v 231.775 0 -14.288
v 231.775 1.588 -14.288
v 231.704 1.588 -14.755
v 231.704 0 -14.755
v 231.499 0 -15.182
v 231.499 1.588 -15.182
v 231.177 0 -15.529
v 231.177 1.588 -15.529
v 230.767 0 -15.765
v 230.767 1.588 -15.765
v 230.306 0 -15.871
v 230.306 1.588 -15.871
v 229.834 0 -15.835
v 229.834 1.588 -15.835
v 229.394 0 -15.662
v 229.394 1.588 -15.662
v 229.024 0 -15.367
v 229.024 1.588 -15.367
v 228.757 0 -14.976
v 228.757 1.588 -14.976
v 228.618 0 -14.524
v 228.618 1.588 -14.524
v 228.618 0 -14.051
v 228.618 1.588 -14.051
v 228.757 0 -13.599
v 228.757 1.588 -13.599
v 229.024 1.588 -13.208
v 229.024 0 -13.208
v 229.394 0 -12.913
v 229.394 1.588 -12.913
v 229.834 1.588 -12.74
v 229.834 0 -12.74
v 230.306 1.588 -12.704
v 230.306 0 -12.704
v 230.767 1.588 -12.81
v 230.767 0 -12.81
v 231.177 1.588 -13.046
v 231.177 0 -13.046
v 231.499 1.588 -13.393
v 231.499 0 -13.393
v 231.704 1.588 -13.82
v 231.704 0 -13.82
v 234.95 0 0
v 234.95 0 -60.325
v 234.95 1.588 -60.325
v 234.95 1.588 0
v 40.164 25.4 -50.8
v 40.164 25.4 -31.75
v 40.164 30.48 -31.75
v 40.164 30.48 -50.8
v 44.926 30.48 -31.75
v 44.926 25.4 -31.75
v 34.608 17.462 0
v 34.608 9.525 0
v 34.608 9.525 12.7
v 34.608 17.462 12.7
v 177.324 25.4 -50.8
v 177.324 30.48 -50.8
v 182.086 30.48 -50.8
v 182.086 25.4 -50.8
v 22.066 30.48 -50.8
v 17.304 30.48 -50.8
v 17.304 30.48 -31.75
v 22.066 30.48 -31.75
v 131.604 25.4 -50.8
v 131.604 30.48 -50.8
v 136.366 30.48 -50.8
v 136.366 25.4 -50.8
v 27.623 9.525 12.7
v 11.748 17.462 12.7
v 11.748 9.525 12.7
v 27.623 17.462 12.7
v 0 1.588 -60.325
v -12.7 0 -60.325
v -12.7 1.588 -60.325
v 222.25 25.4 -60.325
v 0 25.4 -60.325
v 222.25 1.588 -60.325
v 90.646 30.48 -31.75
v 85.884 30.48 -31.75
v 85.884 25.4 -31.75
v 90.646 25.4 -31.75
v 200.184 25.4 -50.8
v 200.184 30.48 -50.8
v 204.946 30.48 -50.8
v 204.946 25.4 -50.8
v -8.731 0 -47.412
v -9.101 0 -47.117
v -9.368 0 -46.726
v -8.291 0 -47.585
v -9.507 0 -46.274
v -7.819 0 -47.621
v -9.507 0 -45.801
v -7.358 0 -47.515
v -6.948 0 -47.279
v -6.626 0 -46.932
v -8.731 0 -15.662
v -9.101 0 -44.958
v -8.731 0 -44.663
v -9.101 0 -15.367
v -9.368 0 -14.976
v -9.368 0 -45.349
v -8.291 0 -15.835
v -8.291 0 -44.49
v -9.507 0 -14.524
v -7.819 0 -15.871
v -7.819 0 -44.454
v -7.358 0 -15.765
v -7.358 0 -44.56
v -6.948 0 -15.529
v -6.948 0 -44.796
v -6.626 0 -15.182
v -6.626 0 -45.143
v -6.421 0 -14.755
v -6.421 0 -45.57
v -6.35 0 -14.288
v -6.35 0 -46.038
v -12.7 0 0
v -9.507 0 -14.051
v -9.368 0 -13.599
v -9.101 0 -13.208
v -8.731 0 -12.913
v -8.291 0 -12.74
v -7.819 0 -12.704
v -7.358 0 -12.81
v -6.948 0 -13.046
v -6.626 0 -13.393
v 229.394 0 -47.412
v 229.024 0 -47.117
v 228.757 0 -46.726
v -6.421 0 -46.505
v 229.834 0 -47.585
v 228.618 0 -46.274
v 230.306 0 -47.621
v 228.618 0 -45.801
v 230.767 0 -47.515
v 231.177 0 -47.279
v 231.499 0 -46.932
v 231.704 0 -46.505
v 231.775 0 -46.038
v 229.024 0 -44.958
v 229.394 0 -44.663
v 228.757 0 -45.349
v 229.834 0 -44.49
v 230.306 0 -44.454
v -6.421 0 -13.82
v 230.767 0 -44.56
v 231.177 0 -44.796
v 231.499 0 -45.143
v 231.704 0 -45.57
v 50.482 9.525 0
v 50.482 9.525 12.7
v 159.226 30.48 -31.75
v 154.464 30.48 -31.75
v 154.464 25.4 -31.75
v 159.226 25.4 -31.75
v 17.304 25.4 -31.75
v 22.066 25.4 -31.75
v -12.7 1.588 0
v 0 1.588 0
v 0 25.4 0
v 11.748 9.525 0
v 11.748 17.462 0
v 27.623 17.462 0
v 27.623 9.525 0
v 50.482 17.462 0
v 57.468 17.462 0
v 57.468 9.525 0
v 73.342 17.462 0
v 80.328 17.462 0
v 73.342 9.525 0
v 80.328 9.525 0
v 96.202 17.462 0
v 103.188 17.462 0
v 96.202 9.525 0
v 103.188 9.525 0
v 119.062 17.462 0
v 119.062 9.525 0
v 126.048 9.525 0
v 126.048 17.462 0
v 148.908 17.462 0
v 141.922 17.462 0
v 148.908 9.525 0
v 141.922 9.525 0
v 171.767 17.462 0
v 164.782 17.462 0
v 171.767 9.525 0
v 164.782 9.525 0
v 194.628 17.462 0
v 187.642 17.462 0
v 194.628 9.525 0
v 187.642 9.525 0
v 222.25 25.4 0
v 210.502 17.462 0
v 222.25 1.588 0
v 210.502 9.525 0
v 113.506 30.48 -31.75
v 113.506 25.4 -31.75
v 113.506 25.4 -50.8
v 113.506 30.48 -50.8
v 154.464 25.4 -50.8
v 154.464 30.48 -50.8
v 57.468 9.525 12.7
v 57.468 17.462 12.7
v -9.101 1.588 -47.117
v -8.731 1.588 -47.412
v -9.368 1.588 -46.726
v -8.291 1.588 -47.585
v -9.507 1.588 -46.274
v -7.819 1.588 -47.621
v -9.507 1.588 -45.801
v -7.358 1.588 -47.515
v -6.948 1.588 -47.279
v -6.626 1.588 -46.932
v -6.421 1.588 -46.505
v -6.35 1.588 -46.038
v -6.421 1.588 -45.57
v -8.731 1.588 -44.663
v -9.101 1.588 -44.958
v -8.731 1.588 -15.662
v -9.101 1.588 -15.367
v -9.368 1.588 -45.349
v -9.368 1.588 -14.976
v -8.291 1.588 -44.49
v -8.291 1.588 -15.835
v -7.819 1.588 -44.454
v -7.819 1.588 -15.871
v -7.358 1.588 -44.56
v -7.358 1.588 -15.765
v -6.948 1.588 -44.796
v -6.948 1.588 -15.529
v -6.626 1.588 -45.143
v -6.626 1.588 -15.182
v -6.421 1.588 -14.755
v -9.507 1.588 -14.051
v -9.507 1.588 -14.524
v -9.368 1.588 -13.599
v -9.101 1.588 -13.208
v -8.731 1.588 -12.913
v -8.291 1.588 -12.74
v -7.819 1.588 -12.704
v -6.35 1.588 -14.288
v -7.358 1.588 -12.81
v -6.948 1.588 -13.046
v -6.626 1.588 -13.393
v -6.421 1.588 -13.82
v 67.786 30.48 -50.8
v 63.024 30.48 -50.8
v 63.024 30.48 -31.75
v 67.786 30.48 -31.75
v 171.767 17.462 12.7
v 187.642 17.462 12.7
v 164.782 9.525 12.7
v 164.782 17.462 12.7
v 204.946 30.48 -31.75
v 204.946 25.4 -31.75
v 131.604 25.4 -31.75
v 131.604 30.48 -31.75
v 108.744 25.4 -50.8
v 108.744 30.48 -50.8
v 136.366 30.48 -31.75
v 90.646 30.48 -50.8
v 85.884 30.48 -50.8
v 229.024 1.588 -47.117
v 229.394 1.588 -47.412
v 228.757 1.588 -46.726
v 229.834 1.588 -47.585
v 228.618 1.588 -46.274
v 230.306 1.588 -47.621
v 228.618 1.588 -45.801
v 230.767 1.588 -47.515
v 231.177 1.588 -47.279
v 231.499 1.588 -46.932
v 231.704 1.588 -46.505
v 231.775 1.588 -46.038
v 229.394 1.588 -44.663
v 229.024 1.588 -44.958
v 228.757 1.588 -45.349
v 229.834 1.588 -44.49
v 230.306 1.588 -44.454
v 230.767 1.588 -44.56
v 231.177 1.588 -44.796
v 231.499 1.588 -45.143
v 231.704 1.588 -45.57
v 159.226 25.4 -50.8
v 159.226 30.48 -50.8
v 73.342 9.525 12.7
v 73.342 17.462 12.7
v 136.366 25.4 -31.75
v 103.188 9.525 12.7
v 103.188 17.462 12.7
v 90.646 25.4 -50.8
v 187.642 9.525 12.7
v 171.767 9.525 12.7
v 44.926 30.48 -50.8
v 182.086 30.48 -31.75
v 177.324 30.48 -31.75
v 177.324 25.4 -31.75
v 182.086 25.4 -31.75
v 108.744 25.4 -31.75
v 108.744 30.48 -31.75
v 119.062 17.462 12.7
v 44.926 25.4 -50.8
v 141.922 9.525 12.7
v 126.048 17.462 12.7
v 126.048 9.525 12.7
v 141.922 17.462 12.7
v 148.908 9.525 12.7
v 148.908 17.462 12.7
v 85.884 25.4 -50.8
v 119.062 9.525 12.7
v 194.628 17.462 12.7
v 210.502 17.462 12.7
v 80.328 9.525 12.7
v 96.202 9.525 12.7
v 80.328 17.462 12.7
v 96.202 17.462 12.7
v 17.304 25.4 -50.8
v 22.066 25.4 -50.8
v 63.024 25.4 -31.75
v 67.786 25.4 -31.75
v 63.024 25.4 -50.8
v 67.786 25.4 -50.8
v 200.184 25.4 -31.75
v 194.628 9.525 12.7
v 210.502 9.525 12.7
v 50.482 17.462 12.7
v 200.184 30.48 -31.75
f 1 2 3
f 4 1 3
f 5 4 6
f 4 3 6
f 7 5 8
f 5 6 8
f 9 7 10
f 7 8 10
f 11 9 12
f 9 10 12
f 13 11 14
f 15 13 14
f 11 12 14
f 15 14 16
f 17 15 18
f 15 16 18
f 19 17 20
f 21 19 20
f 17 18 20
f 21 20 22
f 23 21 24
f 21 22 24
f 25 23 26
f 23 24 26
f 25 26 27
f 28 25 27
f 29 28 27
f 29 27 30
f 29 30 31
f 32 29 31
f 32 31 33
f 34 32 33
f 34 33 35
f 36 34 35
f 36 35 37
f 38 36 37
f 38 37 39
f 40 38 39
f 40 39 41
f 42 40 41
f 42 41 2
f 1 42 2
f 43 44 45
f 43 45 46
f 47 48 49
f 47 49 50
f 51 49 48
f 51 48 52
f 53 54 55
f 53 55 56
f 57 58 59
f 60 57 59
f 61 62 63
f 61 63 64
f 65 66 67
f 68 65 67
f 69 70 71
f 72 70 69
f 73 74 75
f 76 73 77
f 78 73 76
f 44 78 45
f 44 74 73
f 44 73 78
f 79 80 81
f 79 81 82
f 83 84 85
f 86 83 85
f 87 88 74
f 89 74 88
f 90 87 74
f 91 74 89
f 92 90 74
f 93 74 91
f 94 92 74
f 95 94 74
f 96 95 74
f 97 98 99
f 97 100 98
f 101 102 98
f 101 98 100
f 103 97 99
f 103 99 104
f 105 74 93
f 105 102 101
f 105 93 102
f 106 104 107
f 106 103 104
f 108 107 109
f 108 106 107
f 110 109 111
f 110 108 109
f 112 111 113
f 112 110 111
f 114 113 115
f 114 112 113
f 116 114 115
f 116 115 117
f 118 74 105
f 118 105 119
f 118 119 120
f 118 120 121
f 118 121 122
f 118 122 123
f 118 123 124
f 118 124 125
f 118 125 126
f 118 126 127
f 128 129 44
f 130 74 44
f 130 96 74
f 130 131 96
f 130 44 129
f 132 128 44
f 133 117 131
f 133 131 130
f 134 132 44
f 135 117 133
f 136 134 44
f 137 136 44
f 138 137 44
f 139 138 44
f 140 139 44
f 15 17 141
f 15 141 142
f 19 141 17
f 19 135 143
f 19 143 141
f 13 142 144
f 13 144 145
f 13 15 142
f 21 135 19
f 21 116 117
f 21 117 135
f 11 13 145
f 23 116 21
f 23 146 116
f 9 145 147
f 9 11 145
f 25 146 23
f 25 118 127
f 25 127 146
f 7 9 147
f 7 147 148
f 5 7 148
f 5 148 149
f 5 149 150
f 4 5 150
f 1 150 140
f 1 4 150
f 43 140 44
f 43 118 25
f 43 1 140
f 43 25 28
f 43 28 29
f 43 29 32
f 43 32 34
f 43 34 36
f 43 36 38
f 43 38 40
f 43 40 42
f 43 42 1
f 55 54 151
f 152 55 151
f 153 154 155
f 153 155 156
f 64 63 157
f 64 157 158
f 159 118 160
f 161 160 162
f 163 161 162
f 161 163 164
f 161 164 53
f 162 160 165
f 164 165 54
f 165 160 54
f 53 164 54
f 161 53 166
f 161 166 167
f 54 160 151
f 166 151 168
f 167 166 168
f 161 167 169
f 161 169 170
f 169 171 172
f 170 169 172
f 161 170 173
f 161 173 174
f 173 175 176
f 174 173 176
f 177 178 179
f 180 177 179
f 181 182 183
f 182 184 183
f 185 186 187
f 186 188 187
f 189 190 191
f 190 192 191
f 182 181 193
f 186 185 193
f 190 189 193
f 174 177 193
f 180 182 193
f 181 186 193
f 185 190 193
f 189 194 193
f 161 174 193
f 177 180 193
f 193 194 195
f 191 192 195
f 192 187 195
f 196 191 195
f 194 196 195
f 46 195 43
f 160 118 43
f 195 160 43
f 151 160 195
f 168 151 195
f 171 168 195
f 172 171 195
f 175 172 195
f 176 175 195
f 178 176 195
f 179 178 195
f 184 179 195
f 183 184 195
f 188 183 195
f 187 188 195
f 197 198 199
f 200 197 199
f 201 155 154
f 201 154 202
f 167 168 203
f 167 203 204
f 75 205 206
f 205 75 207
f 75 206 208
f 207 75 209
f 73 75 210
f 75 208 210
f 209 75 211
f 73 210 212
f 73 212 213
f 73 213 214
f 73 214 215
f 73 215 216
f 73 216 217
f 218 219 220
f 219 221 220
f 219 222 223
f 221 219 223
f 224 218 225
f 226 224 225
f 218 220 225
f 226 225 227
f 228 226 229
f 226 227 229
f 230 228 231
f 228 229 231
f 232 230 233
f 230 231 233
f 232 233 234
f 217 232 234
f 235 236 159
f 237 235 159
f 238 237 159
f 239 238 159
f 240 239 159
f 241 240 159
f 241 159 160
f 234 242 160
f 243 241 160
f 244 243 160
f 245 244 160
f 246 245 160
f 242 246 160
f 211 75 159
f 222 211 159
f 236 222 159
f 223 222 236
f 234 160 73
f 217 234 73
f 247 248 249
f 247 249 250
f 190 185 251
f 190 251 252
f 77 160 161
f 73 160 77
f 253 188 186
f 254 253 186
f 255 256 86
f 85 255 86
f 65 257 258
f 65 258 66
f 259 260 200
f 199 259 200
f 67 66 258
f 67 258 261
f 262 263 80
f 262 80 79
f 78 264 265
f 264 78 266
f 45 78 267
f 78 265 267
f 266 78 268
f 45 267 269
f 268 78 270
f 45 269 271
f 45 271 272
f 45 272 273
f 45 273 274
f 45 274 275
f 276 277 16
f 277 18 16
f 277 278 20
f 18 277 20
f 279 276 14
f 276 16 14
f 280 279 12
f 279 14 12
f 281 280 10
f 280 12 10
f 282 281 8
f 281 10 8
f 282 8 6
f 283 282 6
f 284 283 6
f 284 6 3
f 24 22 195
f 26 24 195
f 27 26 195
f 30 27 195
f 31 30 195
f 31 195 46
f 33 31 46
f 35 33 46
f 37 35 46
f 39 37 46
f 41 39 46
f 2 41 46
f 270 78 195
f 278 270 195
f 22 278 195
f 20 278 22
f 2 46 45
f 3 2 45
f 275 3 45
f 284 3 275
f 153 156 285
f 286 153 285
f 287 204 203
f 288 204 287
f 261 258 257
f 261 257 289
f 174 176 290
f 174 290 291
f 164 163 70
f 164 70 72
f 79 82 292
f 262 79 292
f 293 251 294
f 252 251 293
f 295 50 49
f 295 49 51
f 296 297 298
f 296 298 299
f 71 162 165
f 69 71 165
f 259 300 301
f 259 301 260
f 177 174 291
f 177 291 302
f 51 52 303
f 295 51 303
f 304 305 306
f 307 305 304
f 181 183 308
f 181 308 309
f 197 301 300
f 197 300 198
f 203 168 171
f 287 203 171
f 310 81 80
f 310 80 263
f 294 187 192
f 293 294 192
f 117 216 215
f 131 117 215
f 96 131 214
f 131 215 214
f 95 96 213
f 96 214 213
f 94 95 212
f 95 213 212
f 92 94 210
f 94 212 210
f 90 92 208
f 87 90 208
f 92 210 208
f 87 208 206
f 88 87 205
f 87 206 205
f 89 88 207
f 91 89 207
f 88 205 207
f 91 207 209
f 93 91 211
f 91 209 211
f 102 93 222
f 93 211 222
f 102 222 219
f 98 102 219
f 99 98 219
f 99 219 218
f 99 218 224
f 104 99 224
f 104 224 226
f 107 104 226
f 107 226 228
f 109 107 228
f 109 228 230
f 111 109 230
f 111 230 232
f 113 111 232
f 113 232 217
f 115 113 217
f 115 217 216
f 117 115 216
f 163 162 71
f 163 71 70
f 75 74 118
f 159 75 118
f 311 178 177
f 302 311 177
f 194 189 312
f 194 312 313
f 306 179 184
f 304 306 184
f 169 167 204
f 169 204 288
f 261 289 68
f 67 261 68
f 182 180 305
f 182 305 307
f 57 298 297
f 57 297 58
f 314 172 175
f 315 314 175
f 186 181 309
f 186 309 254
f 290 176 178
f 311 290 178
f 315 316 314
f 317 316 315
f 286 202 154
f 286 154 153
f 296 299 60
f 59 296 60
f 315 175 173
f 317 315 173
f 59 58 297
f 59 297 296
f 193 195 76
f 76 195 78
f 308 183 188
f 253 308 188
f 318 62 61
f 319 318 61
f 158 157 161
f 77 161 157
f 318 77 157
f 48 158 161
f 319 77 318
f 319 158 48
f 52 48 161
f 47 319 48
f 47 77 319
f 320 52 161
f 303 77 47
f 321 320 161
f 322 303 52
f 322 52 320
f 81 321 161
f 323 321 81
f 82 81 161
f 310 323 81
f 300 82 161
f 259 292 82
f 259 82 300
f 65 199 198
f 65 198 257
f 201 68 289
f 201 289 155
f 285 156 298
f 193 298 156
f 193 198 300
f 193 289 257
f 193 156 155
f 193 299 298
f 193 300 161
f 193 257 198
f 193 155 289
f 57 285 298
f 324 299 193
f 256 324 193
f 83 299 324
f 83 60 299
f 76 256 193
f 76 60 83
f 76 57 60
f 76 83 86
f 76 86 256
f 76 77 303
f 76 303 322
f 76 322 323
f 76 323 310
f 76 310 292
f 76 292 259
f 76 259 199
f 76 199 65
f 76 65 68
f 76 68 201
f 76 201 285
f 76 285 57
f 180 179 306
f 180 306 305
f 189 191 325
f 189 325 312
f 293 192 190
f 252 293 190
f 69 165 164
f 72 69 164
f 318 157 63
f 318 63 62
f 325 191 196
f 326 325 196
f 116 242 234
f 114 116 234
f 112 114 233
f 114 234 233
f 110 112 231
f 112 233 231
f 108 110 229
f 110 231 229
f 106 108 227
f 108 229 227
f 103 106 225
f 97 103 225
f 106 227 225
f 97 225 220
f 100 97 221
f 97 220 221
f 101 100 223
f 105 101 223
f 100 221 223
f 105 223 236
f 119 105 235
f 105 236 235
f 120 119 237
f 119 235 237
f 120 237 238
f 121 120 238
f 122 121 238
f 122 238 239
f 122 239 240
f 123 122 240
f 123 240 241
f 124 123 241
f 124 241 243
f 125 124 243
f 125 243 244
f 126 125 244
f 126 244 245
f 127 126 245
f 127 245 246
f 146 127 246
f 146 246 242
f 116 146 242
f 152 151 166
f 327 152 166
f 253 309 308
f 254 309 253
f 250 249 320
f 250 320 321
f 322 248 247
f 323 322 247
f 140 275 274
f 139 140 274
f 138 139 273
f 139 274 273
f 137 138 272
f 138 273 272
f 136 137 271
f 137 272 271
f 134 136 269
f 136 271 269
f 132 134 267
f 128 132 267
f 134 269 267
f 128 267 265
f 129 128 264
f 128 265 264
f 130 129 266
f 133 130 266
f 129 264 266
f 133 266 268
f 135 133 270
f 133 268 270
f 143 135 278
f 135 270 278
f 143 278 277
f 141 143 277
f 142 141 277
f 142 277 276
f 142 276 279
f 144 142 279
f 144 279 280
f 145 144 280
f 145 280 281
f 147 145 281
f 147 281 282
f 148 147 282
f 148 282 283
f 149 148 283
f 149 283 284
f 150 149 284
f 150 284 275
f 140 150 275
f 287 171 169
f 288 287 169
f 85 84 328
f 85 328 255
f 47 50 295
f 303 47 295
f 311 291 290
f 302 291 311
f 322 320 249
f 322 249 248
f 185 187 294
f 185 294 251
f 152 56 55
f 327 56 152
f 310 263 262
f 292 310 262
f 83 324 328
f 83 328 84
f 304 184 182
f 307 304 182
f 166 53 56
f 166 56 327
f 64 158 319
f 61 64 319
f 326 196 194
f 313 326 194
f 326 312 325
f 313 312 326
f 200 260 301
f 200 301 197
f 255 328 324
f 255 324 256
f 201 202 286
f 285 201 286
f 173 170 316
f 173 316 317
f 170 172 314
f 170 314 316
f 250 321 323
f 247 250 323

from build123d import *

# Parameters (mm, degrees)
SKETCH1_W           = 222.25
SKETCH1_H           = 60.325
BOSS_EXTRUDE1_DEPTH = 25.4
SKETCH2_W           = 12.7
SKETCH2_H           = 60.325
BOSS_EXTRUDE2_DEPTH = 1.5875
SKETCH3_R           = 1.5875
CUT_EXTRUDE1_DEPTH  = 2.5875
SKETCH4_W           = 4.7625
SKETCH4_H           = 19.05
BOSS_EXTRUDE3_DEPTH = 5.08
SKETCH5_W           = 15.875
SKETCH5_H           = 7.9375
BOSS_EXTRUDE4_DEPTH = 12.7
LPATTERN1_COUNT     = 5
LPATTERN1_PITCH     = 22.86
LPATTERN1_COL_COUNT = 5
LPATTERN1_COL_PITCH = 22.86


with BuildPart() as part:
    # Sketch1 → Boss-Extrude1 (new body)
    with BuildSketch(Plane(origin=(0, 0, 0), x_dir=(1, 0, 0), z_dir=(0, 1, 0))):
        with Locations((111.125, 30.1625)):
            Rectangle(SKETCH1_W, SKETCH1_H)
    extrude(amount=BOSS_EXTRUDE1_DEPTH)

    # Sketch2 → Boss-Extrude2 (add)
    with BuildSketch(Plane.XZ):
        with Locations((228.6, -30.1625)):
            Rectangle(SKETCH2_W, SKETCH2_H)
        with Locations((-6.35, -30.1625)):
            Rectangle(SKETCH2_W, SKETCH2_H)
    extrude(amount=-BOSS_EXTRUDE2_DEPTH)

    # Sketch3 → Cut-Extrude1 (cut, through all)
    with BuildSketch(Plane(origin=(0, 1.5875, 0), x_dir=(1, 0, 0), z_dir=(0, 1, 0))):
        with Locations((-7.9375, 46.0375)):
            Circle(SKETCH3_R)
        with Locations((-7.9375, 14.2875)):
            Circle(SKETCH3_R)
        with Locations((230.1875, 14.2875)):
            Circle(SKETCH3_R)
        with Locations((230.1875, 46.0375)):
            Circle(SKETCH3_R)
    extrude(amount=-CUT_EXTRUDE1_DEPTH, mode=Mode.SUBTRACT)

    # Sketch4 → Boss-Extrude3 (add)
    with BuildSketch(Plane(origin=(0, 25.4, 0), x_dir=(1, 0, 0), z_dir=(0, 1, 0))):
        with Locations((111.125, 41.275)):
            Rectangle(SKETCH4_W, SKETCH4_H)
    boss_extrude3 = extrude(amount=BOSS_EXTRUDE3_DEPTH)

    # Sketch5 → Boss-Extrude4 (add)
    with BuildSketch(Plane.XY):
        with Locations((111.125, 13.49375)):
            Rectangle(SKETCH5_W, SKETCH5_H)
    boss_extrude4 = extrude(amount=BOSS_EXTRUDE4_DEPTH)

    # LPattern1: Boss-Extrude3, Boss-Extrude4 ×5
    with Locations(*[(i * LPATTERN1_PITCH, 0, 0) for i in range(1, LPATTERN1_COUNT)]):
        add(boss_extrude3)
        add(boss_extrude4)

    # LPattern1 col: Boss-Extrude3, Boss-Extrude4 ×5
    with Locations(*[(-i * LPATTERN1_COL_PITCH, 0, 0) for i in range(1, LPATTERN1_COL_COUNT)]):
        add(boss_extrude3)
        add(boss_extrude4)


solid = part.part
